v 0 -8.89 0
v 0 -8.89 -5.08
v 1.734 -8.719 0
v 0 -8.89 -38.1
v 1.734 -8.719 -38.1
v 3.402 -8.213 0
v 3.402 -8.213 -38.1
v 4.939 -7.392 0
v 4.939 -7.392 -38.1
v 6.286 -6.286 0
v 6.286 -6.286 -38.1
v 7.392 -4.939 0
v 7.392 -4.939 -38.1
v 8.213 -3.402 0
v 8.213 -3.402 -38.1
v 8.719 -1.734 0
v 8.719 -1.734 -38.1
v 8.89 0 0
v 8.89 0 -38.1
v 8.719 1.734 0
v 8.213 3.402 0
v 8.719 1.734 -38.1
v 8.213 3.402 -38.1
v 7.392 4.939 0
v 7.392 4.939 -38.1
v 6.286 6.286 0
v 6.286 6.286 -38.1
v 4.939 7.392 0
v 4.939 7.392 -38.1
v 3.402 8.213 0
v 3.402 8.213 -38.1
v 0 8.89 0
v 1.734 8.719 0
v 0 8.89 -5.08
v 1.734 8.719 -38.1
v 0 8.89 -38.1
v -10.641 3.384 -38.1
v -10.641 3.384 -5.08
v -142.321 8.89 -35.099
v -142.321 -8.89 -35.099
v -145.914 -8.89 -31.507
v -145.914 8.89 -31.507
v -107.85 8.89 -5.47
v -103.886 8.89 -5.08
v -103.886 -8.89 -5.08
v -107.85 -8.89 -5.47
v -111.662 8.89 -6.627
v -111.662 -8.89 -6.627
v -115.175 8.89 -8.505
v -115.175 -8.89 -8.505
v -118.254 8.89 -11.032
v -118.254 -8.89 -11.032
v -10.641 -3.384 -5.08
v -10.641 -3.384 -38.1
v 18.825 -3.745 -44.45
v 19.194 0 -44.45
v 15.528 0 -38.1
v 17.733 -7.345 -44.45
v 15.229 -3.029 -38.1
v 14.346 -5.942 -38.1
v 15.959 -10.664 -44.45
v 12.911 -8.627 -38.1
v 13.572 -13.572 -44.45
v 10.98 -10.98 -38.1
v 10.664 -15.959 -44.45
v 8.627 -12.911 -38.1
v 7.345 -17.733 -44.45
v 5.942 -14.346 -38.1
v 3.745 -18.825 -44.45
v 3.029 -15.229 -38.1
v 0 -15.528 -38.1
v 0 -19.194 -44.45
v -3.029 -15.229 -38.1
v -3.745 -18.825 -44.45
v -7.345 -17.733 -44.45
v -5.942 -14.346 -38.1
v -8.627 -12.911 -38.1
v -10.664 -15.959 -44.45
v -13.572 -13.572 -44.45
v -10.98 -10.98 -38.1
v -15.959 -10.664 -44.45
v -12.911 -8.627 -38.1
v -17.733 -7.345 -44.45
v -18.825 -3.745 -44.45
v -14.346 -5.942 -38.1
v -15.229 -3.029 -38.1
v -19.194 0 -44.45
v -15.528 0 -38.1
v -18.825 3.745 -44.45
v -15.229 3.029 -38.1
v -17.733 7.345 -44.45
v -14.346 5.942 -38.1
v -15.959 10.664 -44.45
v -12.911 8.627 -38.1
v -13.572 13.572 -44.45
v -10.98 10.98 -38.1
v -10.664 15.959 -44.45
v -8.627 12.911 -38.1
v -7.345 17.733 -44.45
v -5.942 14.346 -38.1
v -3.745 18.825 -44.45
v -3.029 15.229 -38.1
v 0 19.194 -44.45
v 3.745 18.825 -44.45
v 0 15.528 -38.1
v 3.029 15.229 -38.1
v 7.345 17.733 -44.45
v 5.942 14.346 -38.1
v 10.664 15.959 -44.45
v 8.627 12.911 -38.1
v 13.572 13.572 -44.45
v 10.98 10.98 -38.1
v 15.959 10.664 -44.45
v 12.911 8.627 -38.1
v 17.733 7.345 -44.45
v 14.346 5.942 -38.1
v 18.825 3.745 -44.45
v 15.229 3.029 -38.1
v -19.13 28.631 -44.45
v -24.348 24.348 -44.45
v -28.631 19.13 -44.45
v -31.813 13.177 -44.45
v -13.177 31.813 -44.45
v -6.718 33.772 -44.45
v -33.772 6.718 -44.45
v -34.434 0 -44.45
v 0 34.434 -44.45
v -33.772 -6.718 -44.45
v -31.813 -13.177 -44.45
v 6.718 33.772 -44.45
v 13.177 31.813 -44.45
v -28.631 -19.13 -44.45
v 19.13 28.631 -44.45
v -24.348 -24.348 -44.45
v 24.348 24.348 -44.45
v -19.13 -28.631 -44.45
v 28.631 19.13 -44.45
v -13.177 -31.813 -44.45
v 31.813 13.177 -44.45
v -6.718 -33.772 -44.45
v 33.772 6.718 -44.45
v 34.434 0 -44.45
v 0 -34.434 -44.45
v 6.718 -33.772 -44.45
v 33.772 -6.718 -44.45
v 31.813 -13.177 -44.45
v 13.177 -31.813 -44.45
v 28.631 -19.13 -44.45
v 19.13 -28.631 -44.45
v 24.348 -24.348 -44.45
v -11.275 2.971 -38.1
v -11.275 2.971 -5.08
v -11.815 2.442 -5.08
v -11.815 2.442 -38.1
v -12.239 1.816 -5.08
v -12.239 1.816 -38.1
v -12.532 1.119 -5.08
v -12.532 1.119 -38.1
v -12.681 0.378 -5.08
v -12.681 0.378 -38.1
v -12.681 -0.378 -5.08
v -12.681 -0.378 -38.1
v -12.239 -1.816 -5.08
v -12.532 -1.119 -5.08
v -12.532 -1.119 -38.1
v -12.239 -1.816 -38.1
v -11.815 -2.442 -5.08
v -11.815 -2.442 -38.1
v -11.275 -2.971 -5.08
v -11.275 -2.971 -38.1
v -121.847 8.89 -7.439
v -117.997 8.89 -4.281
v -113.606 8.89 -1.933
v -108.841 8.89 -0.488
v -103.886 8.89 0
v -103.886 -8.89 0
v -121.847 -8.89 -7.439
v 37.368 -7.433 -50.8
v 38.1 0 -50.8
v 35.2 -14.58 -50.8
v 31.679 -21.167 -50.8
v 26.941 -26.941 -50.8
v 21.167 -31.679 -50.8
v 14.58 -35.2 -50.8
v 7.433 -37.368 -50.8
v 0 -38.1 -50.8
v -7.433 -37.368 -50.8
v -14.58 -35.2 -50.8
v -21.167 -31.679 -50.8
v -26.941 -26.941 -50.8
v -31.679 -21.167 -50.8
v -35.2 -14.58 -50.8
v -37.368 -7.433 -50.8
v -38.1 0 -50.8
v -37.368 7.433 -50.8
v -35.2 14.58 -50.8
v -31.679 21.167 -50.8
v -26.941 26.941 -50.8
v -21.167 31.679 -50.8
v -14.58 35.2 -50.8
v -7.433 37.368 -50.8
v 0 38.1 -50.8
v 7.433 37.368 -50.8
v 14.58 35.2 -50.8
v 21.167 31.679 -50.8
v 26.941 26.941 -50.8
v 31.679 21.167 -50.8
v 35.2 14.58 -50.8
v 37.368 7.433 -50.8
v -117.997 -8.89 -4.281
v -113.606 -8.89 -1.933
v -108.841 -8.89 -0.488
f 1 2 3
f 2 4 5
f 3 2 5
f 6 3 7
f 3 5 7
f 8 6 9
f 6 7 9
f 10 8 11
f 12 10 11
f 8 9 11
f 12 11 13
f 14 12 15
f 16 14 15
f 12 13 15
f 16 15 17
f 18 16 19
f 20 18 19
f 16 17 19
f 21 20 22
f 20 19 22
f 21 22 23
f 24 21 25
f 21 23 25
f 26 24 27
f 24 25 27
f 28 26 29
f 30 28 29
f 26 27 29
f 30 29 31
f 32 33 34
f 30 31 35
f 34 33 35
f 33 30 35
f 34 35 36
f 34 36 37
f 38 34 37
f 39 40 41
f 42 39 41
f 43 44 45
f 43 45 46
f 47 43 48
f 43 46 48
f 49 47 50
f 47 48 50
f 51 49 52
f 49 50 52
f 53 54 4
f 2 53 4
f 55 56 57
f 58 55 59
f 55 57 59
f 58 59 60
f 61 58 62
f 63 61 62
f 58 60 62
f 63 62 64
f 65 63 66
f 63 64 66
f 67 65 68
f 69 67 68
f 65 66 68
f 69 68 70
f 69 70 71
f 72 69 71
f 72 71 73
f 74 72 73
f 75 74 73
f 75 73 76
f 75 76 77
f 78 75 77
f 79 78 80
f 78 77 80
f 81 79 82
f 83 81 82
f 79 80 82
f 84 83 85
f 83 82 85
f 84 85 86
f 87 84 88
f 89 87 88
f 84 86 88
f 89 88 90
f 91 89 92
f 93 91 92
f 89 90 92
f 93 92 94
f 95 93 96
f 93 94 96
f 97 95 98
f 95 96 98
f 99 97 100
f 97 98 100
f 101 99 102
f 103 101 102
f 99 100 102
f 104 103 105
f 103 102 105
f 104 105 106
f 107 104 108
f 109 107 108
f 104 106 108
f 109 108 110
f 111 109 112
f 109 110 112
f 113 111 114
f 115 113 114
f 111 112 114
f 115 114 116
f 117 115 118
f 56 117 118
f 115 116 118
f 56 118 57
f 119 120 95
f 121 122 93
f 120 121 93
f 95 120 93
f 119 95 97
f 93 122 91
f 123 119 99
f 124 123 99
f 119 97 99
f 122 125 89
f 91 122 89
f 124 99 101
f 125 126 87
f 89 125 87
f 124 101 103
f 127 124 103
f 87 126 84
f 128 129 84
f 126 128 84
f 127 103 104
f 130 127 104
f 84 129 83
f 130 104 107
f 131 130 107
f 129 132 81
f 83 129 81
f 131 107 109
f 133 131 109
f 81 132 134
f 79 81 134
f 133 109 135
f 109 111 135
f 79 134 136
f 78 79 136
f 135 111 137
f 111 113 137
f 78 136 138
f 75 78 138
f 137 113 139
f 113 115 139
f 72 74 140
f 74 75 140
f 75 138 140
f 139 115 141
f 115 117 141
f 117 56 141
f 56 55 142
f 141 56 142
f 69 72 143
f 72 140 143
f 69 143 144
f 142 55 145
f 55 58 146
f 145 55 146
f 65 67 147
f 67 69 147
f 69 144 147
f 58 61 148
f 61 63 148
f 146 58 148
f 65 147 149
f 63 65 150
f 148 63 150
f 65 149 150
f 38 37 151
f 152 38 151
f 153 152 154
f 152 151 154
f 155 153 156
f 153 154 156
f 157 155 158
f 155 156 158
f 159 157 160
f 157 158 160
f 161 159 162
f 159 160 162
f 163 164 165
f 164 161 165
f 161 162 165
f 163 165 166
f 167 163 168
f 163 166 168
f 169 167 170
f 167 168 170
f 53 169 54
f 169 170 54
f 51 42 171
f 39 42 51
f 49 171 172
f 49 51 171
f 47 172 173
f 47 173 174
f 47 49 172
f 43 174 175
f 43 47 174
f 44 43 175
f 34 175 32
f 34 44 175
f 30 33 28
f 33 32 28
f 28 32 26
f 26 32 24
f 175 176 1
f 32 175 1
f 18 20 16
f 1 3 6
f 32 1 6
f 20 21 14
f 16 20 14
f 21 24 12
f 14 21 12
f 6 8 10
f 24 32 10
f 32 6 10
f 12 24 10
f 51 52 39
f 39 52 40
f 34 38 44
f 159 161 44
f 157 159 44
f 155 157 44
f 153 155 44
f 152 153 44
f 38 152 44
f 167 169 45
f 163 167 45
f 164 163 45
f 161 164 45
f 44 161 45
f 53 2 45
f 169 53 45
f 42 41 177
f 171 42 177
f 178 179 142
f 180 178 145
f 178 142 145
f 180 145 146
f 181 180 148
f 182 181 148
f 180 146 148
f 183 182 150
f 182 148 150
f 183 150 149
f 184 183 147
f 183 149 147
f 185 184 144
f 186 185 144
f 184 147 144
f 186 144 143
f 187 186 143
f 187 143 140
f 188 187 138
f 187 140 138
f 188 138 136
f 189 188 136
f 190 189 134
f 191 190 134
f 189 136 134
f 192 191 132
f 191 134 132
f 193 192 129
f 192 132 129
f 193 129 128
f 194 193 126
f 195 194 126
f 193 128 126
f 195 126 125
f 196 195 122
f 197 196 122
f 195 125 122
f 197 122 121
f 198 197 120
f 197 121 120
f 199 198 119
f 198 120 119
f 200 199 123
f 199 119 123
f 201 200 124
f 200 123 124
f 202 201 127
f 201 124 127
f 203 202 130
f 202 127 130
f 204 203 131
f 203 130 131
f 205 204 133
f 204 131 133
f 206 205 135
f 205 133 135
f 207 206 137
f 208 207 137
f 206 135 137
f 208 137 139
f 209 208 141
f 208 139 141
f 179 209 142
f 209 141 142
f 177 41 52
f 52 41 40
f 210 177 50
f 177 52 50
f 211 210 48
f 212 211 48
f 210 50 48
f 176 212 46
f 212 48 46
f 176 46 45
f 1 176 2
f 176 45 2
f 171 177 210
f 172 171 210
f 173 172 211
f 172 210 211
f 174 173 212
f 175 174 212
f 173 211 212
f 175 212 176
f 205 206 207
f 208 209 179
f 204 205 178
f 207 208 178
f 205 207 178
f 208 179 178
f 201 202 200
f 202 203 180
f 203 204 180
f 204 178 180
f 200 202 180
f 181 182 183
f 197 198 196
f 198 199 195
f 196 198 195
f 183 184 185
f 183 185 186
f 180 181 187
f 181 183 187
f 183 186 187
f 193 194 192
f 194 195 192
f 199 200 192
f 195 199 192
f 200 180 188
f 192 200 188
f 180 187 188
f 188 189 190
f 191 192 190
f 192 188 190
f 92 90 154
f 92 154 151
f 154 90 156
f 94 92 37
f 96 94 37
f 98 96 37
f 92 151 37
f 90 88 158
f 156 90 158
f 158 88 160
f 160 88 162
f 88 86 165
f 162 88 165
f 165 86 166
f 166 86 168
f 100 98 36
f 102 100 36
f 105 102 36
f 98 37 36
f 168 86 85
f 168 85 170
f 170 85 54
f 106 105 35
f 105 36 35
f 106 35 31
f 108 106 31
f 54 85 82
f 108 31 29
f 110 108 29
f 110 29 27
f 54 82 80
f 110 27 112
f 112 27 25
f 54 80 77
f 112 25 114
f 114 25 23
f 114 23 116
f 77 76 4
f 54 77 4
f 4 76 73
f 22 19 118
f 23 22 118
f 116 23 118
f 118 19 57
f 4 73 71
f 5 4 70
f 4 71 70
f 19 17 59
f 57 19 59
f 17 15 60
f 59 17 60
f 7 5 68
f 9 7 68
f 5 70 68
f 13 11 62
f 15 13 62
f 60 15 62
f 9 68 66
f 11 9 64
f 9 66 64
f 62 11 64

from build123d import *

# Parameters (mm, degrees)
BOSS_EXTRUDE1_DEPTH = 38.1
CUT_EXTRUDE1_START  = -5.08
CUT_EXTRUDE1_DEPTH  = 5.08
SWEEP1_START        = -8.89
SWEEP1_DEPTH        = 17.78


# Read off the part's stored shape, not the designer's step: Sweep1
with BuildPart() as part:
    # Sketch2 → Revolve1 (revolve)
    with BuildSketch(Plane(origin=(0, 0, 0), x_dir=(1, 0, 0), z_dir=(0, 1, 0))):
        Polygon((0, 50.8), (38.1, 50.8), (34.433825791, 44.45), (19.193825791, 44.45), (15.527651581, 38.1), (0, 38.1), align=None)
    revolve(axis=Axis((0, 0, 0), (0, 0, -1)))

    # Sketch3 → Boss-Extrude1 (add)
    with BuildSketch(Plane.XY.offset(-38.1)):
        with BuildLine():
            Line((0, 8.89), (-10.640962008, 3.383819151))
            ThreePointArc((-10.640962008, 3.383819151), (-12.7, 0), (-10.640962008, -3.383819151))
            Line((-10.640962008, -3.383819151), (0, -8.89))
            ThreePointArc((0, -8.89), (8.89, 0), (0, 8.89))
        make_face()
    extrude(amount=BOSS_EXTRUDE1_DEPTH)

    # Sketch4 → Cut-Extrude1 (cut)
    with BuildSketch(Plane.XY.offset(CUT_EXTRUDE1_START)):
        with BuildLine():
            Line((0, 8.89), (0, -8.89))
            Line((0, -8.89), (-10.640962008, -3.383819151))
            ThreePointArc((-10.640962008, -3.383819151), (-12.7, 0), (-10.640962008, 3.383819151))
            Line((-10.640962008, 3.383819151), (0, 8.89))
        make_face()
    extrude(amount=CUT_EXTRUDE1_DEPTH, mode=Mode.SUBTRACT)

    # Sweep1 outline → Sweep1 (add)
    with BuildSketch(Plane(origin=(0, 0, 0), x_dir=(1, 0, 0), z_dir=(0, 1, 0)).offset(SWEEP1_START)):
        with BuildLine():
            Line((-103.886, 0), (0, 0))
            Line((0, 0), (0, 5.08))
            Line((0, 5.08), (-103.886, 5.08))
            ThreePointArc((-103.886, 5.08), (-111.662127346, 6.626767899), (-118.254409794, 11.031590206))
            Line((-118.254409794, 11.031590206), (-142.321496198, 35.098676611))
            Line((-142.321496198, 35.098676611), (-145.913598647, 31.506574162))
            Line((-145.913598647, 31.506574162), (-121.846512242, 7.439487758))
            ThreePointArc((-121.846512242, 7.439487758), (-113.606159182, 1.933459874), (-103.886, 0))
        make_face()
    extrude(amount=SWEEP1_DEPTH)


solid = part.part
